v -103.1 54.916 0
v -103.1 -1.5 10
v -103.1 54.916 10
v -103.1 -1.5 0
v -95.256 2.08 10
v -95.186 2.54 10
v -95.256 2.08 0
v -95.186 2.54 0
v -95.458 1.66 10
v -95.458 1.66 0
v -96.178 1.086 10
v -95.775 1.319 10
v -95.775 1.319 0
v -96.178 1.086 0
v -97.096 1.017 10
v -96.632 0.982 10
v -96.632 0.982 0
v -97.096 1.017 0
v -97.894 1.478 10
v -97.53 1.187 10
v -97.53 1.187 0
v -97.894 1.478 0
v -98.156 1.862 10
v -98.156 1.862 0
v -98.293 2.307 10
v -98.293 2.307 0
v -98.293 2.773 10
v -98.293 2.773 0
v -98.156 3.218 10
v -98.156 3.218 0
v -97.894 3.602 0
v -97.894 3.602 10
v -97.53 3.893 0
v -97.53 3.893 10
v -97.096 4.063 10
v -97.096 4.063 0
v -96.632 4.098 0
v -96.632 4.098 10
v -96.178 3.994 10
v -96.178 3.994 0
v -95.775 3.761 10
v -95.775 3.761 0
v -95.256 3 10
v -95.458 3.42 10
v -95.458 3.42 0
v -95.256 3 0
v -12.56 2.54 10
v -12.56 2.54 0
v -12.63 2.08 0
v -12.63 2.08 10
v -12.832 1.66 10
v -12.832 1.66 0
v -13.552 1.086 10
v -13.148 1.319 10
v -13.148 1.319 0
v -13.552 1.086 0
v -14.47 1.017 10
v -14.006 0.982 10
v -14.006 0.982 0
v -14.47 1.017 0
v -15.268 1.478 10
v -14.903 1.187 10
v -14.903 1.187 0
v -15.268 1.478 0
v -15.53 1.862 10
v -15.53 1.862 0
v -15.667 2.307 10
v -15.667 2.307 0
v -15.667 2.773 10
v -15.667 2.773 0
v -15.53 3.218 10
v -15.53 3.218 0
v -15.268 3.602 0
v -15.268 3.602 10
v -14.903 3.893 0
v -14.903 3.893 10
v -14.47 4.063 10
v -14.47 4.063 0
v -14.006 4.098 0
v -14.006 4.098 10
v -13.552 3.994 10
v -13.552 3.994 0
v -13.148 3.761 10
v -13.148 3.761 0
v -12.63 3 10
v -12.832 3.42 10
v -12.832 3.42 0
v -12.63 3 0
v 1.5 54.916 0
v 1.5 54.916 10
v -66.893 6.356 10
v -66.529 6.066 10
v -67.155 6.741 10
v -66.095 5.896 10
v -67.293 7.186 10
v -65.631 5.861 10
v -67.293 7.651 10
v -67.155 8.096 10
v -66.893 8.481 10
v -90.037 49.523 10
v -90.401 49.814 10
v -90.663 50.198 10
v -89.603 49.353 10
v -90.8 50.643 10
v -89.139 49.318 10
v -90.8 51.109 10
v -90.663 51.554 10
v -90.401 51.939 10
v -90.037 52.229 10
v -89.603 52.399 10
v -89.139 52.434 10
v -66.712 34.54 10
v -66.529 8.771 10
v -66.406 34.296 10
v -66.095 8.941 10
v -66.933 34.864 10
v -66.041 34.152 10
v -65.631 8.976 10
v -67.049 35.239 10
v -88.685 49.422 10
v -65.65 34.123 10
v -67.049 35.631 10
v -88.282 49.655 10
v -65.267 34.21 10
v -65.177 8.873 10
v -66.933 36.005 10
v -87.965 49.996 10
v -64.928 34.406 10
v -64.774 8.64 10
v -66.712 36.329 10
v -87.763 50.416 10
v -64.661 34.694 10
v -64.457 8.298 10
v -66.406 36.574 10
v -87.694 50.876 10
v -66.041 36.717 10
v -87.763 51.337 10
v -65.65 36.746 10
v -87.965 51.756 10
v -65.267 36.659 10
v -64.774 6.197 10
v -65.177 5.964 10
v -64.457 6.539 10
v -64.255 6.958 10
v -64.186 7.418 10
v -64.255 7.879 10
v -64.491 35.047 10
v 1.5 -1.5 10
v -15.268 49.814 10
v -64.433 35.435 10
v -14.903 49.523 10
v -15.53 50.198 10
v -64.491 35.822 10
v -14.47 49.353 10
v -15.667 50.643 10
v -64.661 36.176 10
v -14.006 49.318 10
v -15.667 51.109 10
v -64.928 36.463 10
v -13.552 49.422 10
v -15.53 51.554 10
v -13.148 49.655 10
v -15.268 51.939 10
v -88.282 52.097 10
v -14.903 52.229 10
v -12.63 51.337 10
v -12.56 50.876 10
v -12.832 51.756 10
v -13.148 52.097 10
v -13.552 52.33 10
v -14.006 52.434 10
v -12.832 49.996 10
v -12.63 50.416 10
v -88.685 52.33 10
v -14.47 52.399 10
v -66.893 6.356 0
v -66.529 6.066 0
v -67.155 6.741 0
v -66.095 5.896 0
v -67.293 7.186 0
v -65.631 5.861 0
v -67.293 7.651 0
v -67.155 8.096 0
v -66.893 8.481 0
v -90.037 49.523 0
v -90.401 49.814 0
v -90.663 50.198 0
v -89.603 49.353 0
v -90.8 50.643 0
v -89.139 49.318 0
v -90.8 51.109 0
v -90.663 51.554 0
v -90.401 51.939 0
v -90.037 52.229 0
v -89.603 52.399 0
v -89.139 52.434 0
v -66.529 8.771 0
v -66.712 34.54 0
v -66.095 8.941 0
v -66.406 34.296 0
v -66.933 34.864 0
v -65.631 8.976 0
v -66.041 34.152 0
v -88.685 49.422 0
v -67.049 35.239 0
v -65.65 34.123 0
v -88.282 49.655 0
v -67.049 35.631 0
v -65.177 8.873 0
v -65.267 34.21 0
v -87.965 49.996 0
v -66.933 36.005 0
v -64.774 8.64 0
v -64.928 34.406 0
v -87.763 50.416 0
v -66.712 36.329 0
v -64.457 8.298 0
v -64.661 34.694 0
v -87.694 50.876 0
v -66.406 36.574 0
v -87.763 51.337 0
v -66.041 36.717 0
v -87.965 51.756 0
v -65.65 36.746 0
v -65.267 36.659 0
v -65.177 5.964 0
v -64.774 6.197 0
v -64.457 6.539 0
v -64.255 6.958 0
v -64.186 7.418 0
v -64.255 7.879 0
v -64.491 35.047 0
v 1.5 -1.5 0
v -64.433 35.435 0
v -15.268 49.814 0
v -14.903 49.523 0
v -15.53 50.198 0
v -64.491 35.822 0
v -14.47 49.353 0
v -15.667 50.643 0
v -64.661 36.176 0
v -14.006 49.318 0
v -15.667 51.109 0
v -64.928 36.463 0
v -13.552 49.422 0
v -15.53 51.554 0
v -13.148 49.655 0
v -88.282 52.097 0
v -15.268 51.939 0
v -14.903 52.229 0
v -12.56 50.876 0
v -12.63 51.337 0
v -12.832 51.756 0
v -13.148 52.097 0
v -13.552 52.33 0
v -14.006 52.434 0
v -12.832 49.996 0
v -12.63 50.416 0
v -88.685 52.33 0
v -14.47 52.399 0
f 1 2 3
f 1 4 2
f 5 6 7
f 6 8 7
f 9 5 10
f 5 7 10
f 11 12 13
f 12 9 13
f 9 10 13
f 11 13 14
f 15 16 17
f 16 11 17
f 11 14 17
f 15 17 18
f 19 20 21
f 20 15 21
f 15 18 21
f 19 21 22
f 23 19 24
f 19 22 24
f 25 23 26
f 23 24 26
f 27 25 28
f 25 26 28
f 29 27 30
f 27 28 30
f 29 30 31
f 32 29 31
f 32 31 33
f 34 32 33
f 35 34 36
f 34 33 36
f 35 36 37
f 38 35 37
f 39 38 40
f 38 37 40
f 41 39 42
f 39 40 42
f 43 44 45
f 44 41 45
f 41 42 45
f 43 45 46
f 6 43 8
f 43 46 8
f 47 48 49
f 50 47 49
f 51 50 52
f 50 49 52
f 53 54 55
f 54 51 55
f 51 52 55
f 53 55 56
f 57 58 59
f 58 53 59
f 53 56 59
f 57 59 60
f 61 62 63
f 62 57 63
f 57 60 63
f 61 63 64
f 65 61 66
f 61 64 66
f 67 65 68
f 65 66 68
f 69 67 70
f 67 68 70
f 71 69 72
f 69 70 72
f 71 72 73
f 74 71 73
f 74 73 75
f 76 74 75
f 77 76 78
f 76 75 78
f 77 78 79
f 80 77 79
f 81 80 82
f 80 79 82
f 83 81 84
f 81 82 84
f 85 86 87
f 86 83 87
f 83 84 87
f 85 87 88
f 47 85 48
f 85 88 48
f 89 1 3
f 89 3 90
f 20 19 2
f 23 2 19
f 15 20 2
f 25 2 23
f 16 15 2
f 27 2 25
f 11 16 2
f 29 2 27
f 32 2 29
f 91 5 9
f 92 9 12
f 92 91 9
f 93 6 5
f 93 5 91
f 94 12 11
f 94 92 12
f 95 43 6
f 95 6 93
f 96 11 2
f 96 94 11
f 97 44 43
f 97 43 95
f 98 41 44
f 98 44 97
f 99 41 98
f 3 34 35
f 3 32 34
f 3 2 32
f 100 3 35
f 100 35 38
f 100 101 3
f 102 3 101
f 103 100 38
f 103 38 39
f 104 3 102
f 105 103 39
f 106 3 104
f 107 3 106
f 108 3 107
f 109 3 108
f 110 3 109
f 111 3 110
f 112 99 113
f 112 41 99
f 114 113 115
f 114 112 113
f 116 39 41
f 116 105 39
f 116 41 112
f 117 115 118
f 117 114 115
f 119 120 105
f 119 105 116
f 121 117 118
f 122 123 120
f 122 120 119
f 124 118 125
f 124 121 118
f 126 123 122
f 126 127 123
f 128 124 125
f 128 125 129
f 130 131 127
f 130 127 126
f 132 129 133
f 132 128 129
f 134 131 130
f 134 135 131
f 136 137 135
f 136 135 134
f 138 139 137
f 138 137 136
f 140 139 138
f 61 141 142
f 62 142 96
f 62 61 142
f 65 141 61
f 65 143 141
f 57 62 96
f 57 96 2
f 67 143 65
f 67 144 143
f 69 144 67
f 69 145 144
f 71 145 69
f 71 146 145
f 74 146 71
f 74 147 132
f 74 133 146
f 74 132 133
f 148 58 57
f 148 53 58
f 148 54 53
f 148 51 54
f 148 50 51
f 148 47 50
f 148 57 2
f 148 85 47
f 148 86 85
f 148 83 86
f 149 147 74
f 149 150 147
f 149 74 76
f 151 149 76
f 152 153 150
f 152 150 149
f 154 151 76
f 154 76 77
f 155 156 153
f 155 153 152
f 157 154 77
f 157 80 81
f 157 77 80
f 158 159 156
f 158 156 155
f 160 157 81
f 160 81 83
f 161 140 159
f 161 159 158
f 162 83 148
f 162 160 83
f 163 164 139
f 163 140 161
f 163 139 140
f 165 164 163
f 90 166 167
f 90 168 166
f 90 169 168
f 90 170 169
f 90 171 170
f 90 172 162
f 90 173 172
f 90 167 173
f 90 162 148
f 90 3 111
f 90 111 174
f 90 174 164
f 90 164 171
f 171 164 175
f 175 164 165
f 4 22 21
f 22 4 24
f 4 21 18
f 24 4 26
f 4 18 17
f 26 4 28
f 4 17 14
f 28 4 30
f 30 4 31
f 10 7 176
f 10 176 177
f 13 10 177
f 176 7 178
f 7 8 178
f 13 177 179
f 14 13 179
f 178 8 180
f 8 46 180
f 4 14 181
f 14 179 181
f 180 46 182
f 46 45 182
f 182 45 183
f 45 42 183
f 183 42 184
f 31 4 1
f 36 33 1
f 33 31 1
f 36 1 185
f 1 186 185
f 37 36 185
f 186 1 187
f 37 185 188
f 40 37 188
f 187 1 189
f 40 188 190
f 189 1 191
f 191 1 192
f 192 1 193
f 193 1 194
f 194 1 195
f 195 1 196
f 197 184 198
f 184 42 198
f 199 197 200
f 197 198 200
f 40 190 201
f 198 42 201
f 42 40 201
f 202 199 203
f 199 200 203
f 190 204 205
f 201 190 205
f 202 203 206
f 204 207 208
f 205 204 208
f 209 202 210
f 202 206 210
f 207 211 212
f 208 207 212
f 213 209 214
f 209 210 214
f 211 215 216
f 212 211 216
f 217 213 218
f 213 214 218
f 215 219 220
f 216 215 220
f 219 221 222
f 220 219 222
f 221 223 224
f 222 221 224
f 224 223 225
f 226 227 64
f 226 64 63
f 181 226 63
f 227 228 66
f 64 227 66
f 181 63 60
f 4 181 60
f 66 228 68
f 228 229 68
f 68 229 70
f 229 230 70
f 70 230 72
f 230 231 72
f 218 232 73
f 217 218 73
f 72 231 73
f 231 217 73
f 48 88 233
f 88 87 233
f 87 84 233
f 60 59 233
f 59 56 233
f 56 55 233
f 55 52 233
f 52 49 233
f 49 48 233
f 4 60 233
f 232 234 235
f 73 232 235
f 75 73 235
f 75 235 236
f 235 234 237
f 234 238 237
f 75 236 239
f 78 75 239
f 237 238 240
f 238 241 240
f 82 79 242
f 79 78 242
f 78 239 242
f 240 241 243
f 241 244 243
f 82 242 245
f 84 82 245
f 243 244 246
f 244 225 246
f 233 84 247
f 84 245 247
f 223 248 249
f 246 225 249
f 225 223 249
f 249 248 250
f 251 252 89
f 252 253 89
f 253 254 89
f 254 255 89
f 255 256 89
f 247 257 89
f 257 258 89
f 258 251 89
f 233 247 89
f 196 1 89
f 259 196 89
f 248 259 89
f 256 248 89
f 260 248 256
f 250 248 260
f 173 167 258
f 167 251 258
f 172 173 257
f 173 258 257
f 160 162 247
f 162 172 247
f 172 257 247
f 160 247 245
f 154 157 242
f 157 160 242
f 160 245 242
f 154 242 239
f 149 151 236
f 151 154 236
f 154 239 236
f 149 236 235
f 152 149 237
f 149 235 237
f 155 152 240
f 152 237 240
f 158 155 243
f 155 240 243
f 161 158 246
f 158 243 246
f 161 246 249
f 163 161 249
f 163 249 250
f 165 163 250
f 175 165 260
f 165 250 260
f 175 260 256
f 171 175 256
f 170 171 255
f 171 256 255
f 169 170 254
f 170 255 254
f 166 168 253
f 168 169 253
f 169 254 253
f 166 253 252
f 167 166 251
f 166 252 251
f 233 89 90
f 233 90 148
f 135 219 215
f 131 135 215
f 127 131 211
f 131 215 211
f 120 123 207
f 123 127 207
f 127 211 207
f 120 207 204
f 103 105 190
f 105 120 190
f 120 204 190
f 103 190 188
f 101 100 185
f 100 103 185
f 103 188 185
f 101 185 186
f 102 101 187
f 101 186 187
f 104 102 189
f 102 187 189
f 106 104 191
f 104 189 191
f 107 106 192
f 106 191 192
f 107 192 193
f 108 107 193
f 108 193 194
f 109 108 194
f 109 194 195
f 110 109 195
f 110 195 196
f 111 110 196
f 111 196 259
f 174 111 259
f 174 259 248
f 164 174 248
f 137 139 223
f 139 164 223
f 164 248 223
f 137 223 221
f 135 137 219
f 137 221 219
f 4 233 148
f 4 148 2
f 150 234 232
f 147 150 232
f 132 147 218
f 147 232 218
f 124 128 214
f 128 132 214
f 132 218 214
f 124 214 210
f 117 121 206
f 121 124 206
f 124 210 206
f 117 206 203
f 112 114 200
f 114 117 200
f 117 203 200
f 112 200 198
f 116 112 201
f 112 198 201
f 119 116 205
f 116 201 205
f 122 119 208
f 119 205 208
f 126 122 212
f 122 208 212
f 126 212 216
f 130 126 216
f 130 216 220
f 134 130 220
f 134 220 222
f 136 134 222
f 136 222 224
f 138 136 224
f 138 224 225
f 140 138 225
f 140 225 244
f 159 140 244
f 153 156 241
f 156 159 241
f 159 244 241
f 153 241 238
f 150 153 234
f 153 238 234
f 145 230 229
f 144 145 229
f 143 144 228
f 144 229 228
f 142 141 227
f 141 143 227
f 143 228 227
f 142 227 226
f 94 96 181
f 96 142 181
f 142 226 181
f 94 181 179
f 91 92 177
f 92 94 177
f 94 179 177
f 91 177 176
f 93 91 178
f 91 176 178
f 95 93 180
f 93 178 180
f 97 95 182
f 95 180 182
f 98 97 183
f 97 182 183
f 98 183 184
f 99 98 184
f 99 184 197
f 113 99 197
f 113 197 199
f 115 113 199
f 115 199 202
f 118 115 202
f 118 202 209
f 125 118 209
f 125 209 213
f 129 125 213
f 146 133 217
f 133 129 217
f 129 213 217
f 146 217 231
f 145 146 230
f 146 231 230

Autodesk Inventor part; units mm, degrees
ref_plane "YZ Plane" through (0, 0, 0) normal (1, 0, 0) x (0, 1, 0)
ref_plane "XZ Plane" through (0, 0, 0) normal (0, 1, 0) x (-1, 0, 0)
ref_plane "XY Plane" through (0, 0, 0) normal (0, 0, 1) x (1, 0, 0)
ref_plane "작업 평면1" through (0, 0, 0) normal (0, 0, 1) x (1, 0, 0)
sketch "스케치1" plane through (0, 0, 0) normal (0, 0, 1) x (1, 0, 0)
  line L0 (-103.1, 54.9162) -> (1.5, 54.9162)
  line L1 (1.5, 54.9162) -> (1.5, -1.5)
  line L2 (1.5, -1.5) -> (-103.1, -1.5)
  line L3 (-103.1, -1.5) -> (-103.1, 54.9162)
  line L4 (0, 1.524) -> (0, 51.8922) projected
  line L5 (-99.06, 40.7162) -> (-101.6, 38.1762) projected
  line L6 (-101.6, 38.1762) -> (-101.6, 3.556) projected
  line L7 (-101.6, 3.556) -> (-98.044, 0) projected
  line L8 (-98.044, 0) -> (-1.524, 0) projected
  line L9 (-1.524, 0) -> (0, 1.524) projected
  line L10 (0, 1.524) -> (0, 51.8922) projected
  line L11 (0, 51.8922) -> (-1.524, 53.4162) projected
  line L12 (-1.524, 53.4162) -> (-97.2966, 53.4162) projected
  line L13 (-97.2966, 53.4162) -> (-99.06, 51.6528) projected
  line L14 (-99.06, 51.6528) -> (-99.06, 40.7162) projected
  circle A0 centre (-89.2556, 50.8762) radius 1.5621 projected
  circle A1 centre (-65.7479, 35.4347) radius 1.3153 projected
  circle A2 centre (-65.7479, 7.4185) radius 1.5621 projected
  circle A3 centre (-96.7486, 2.54) radius 1.5621 projected
  circle A4 centre (-14.1224, 2.54) radius 1.5621 projected
  circle A5 centre (-14.1224, 50.8762) radius 1.5621 projected
  line L15 (-91.7703, 3.1886) -> (-92.8414, 3.1886) projected
  line L16 (-91.7703, 1.1751) -> (-91.7703, 3.1886) projected
  line L17 (-92.8414, 1.1751) -> (-91.7703, 1.1751) projected
  line L18 (-92.8414, 3.1886) -> (-92.8414, 1.1751) projected
  line L19 (-86.6903, 1.1751) -> (-86.6903, 3.1886) projected
  line L20 (-87.7614, 1.1751) -> (-86.6903, 1.1751) projected
  line L21 (-87.7614, 3.1886) -> (-87.7614, 1.1751) projected
  line L22 (-86.6903, 3.1886) -> (-87.7614, 3.1886) projected
  line L23 (-81.6103, 1.1751) -> (-81.6103, 3.1886) projected
  line L24 (-82.6814, 1.1751) -> (-81.6103, 1.1751) projected
  line L25 (-82.6814, 3.1886) -> (-82.6814, 1.1751) projected
  line L26 (-81.6103, 3.1886) -> (-82.6814, 3.1886) projected
  line L27 (-76.5303, 1.1751) -> (-76.5303, 3.1886) projected
  line L28 (-77.6014, 1.1751) -> (-76.5303, 1.1751) projected
  line L29 (-77.6014, 3.1886) -> (-77.6014, 1.1751) projected
  line L30 (-76.5303, 3.1886) -> (-77.6014, 3.1886) projected
  line L31 (-68.6825, 3.4297) -> (-69.7244, 3.4297) projected
  line L32 (-68.6825, 1.346) -> (-68.6825, 3.4297) projected
  line L33 (-69.7244, 1.346) -> (-68.6825, 1.346) projected
  line L34 (-69.7244, 3.4297) -> (-69.7244, 1.346) projected
  line L35 (-63.6025, 1.346) -> (-63.6025, 3.4297) projected
  line L36 (-64.6444, 1.346) -> (-63.6025, 1.346) projected
  line L37 (-64.6444, 3.4297) -> (-64.6444, 1.346) projected
  line L38 (-63.6025, 3.4297) -> (-64.6444, 3.4297) projected
  line L39 (-58.5225, 1.346) -> (-58.5225, 3.4297) projected
  line L40 (-59.5644, 1.346) -> (-58.5225, 1.346) projected
  line L41 (-59.5644, 3.4297) -> (-59.5644, 1.346) projected
  line L42 (-58.5225, 3.4297) -> (-59.5644, 3.4297) projected
  line L43 (-53.4425, 1.346) -> (-53.4425, 3.4297) projected
  line L44 (-54.4844, 1.346) -> (-53.4425, 1.346) projected
  line L45 (-54.4844, 3.4297) -> (-54.4844, 1.346) projected
  line L46 (-53.4425, 3.4297) -> (-54.4844, 3.4297) projected
  line L47 (-45.4737, 3.6867) -> (-46.5774, 3.6867) projected
  line L48 (-45.4737, 1.6118) -> (-45.4737, 3.6867) projected
  line L49 (-46.5774, 1.6118) -> (-45.4737, 1.6118) projected
  line L50 (-46.5774, 3.6867) -> (-46.5774, 1.6118) projected
  line L51 (-40.3937, 1.6118) -> (-40.3937, 3.6867) projected
  line L52 (-41.4974, 1.6118) -> (-40.3937, 1.6118) projected
  line L53 (-41.4974, 3.6867) -> (-41.4974, 1.6118) projected
  line L54 (-40.3937, 3.6867) -> (-41.4974, 3.6867) projected
  line L55 (-35.3137, 1.6118) -> (-35.3137, 3.6867) projected
  line L56 (-36.4174, 1.6118) -> (-35.3137, 1.6118) projected
  line L57 (-36.4174, 3.6867) -> (-36.4174, 1.6118) projected
  line L58 (-35.3137, 3.6867) -> (-36.4174, 3.6867) projected
  circle A6 centre (-97.5648, 7.2848) radius 0.5739 projected
  circle A7 centre (-95.0248, 7.2848) radius 0.5739 projected
  circle A8 centre (-95.0248, 9.8248) radius 0.5739 projected
  circle A9 centre (-95.0248, 12.3648) radius 0.5739 projected
  circle A10 centre (-95.0248, 14.9048) radius 0.5739 projected
  circle A11 centre (-95.0248, 17.4448) radius 0.5739 projected
  circle A12 centre (-95.0248, 19.9848) radius 0.5739 projected
  circle A13 centre (-95.0248, 22.5248) radius 0.5739 projected
  circle A14 centre (-95.0248, 25.0648) radius 0.5739 projected
  circle A15 centre (-95.0248, 27.6048) radius 0.5739 projected
  circle A16 centre (-95.0248, 30.1448) radius 0.5739 projected
  circle A17 centre (-95.0248, 32.6848) radius 0.5739 projected
  circle A18 centre (-95.0248, 35.2248) radius 0.5739 projected
  circle A19 centre (-95.0248, 37.7648) radius 0.5739 projected
  circle A20 centre (-95.0248, 40.3048) radius 0.5739 projected
  circle A21 centre (-95.0248, 42.8448) radius 0.5739 projected
  circle A22 centre (-95.0248, 45.3848) radius 0.5739 projected
  circle A23 centre (-95.0248, 47.9248) radius 0.5739 projected
  circle A24 centre (-95.0248, 50.4648) radius 0.5739 projected
  line L59 (-81.8933, 50.0717) -> (-81.8933, 51.6679) projected
  line L60 (-82.3984, 50.0717) -> (-81.8933, 50.0717) projected
  line L61 (-82.3984, 51.6679) -> (-82.3984, 50.0717) projected
  line L62 (-81.8933, 51.6679) -> (-82.3984, 51.6679) projected
  line L63 (-76.8133, 50.0717) -> (-76.8133, 51.6679) projected
  line L64 (-77.3184, 50.0717) -> (-76.8133, 50.0717) projected
  line L65 (-77.3184, 51.6679) -> (-77.3184, 50.0717) projected
  line L66 (-76.8133, 51.6679) -> (-77.3184, 51.6679) projected
  line L67 (-71.7333, 50.0717) -> (-71.7333, 51.6679) projected
  line L68 (-72.2384, 50.0717) -> (-71.7333, 50.0717) projected
  line L69 (-72.2384, 51.6679) -> (-72.2384, 50.0717) projected
  line L70 (-71.7333, 51.6679) -> (-72.2384, 51.6679) projected
  line L71 (-63.4227, 51.9137) -> (-64.2563, 51.9137) projected
  line L72 (-63.4227, 50.0717) -> (-63.4227, 51.9137) projected
  line L73 (-64.2563, 50.0717) -> (-63.4227, 50.0717) projected
  line L74 (-64.2563, 51.9137) -> (-64.2563, 50.0717) projected
  line L75 (-58.3427, 50.0717) -> (-58.3427, 51.9137) projected
  line L76 (-59.1763, 50.0717) -> (-58.3427, 50.0717) projected
  line L77 (-59.1763, 51.9137) -> (-59.1763, 50.0717) projected
  line L78 (-58.3427, 51.9137) -> (-59.1763, 51.9137) projected
  line L79 (-53.2627, 50.0717) -> (-53.2627, 51.9137) projected
  line L80 (-54.0963, 50.0717) -> (-53.2627, 50.0717) projected
  line L81 (-54.0963, 51.9137) -> (-54.0963, 50.0717) projected
  line L82 (-53.2627, 51.9137) -> (-54.0963, 51.9137) projected
  line L83 (-48.1827, 50.0717) -> (-48.1827, 51.9137) projected
  line L84 (-49.0163, 50.0717) -> (-48.1827, 50.0717) projected
  line L85 (-49.0163, 51.9137) -> (-49.0163, 50.0717) projected
  line L86 (-48.1827, 51.9137) -> (-49.0163, 51.9137) projected
  line L87 (-41.4974, 51.9137) -> (-42.4723, 51.9137) projected
  line L88 (-41.4974, 50.0717) -> (-41.4974, 51.9137) projected
  line L89 (-42.4723, 50.0717) -> (-41.4974, 50.0717) projected
  line L90 (-42.4723, 51.9137) -> (-42.4723, 50.0717) projected
  line L91 (-36.4174, 50.0717) -> (-36.4174, 51.9137) projected
  line L92 (-37.3923, 50.0717) -> (-36.4174, 50.0717) projected
  line L93 (-37.3923, 51.9137) -> (-37.3923, 50.0717) projected
  line L94 (-36.4174, 51.9137) -> (-37.3923, 51.9137) projected
  line L95 (-31.3374, 50.0717) -> (-31.3374, 51.9137) projected
  line L96 (-32.3123, 50.0717) -> (-31.3374, 50.0717) projected
  line L97 (-32.3123, 51.9137) -> (-32.3123, 50.0717) projected
  line L98 (-31.3374, 51.9137) -> (-32.3123, 51.9137) projected
  line L99 (-26.2574, 50.0717) -> (-26.2574, 51.9137) projected
  line L100 (-27.2323, 50.0717) -> (-26.2574, 50.0717) projected
  line L101 (-27.2323, 51.9137) -> (-27.2323, 50.0717) projected
  line L102 (-26.2574, 51.9137) -> (-27.2323, 51.9137) projected
  circle A25 centre (-20.5945, 47.6784) radius 0.5437 projected
  circle A26 centre (-18.0545, 47.6784) radius 0.5437 projected
  circle A27 centre (-20.5945, 45.1384) radius 0.5437 projected
  circle A28 centre (-15.5145, 45.1384) radius 0.5437 projected
  circle A29 centre (-5.7466, 39.5769) radius 0.4144 projected
  circle A30 centre (-5.7466, 37.0369) radius 0.4144 projected
  line L103 (-7.393, 4.043) -> (-10.0091, 4.043) projected
  line L104 (-7.393, 3.3305) -> (-7.393, 4.043) projected
  line L105 (-10.0091, 3.3305) -> (-7.393, 3.3305) projected
  line L106 (-10.0091, 4.043) -> (-10.0091, 3.3305) projected
  line L107 (-2.4767, 32.5537) -> (-4.2776, 32.5537) projected
  line L108 (-2.4767, 31.6979) -> (-2.4767, 32.5537) projected
  line L109 (-4.2776, 31.6979) -> (-2.4767, 31.6979) projected
  line L110 (-4.2776, 32.5537) -> (-4.2776, 31.6979) projected
  line L111 (-2.249, 44.6927) -> (-4.5054, 44.6927) projected
  line L112 (-2.249, 43.8153) -> (-2.249, 44.6927) projected
  line L113 (-4.5054, 43.8153) -> (-2.249, 43.8153) projected
  line L114 (-4.5054, 44.6927) -> (-4.5054, 43.8153) projected
  line L115 (-5.2737, 10.2292) -> (-5.7128, 10.2292) projected
  line L116 (-5.2737, 7.3652) -> (-5.2737, 10.2292) projected
  line L117 (-5.7128, 7.3652) -> (-5.2737, 7.3652) projected
  line L118 (-5.7128, 10.2292) -> (-5.7128, 7.3652) projected
  circle A31 centre (-8.2866, 37.0369) radius 0.4144 projected
  line L119 (-11.4599, 10.2292) -> (-12.1472, 10.2292) projected
  line L120 (-11.4599, 7.3652) -> (-11.4599, 10.2292) projected
  line L121 (-12.1472, 7.3652) -> (-11.4599, 7.3652) projected
  line L122 (-12.1472, 10.2292) -> (-12.1472, 7.3652) projected
  circle A32 centre (-18.0545, 45.1384) radius 0.5437 projected
  circle A33 centre (-15.5145, 47.6784) radius 0.5437 projected
  circle A34 centre (-8.2866, 39.5769) radius 0.4144 projected
  line L123 (-23.7174, 50.0717) -> (-23.7174, 51.9137) projected
  line L124 (-24.6923, 50.0717) -> (-23.7174, 50.0717) projected
  line L125 (-24.6923, 51.9137) -> (-24.6923, 50.0717) projected
  line L126 (-23.7174, 51.9137) -> (-24.6923, 51.9137) projected
  line L127 (-28.7974, 50.0717) -> (-28.7974, 51.9137) projected
  line L128 (-29.7723, 50.0717) -> (-28.7974, 50.0717) projected
  line L129 (-29.7723, 51.9137) -> (-29.7723, 50.0717) projected
  line L130 (-28.7974, 51.9137) -> (-29.7723, 51.9137) projected
  line L131 (-33.8774, 50.0717) -> (-33.8774, 51.9137) projected
  line L132 (-34.8523, 50.0717) -> (-33.8774, 50.0717) projected
  line L133 (-34.8523, 51.9137) -> (-34.8523, 50.0717) projected
  line L134 (-33.8774, 51.9137) -> (-34.8523, 51.9137) projected
  line L135 (-38.9574, 50.0717) -> (-38.9574, 51.9137) projected
  line L136 (-39.9323, 50.0717) -> (-38.9574, 50.0717) projected
  line L137 (-39.9323, 51.9137) -> (-39.9323, 50.0717) projected
  line L138 (-38.9574, 51.9137) -> (-39.9323, 51.9137) projected
  line L139 (-45.6427, 50.0717) -> (-45.6427, 51.9137) projected
  line L140 (-46.4763, 50.0717) -> (-45.6427, 50.0717) projected
  line L141 (-46.4763, 51.9137) -> (-46.4763, 50.0717) projected
  line L142 (-45.6427, 51.9137) -> (-46.4763, 51.9137) projected
  line L143 (-50.7227, 50.0717) -> (-50.7227, 51.9137) projected
  line L144 (-51.5563, 50.0717) -> (-50.7227, 50.0717) projected
  line L145 (-51.5563, 51.9137) -> (-51.5563, 50.0717) projected
  line L146 (-50.7227, 51.9137) -> (-51.5563, 51.9137) projected
  line L147 (-55.8027, 50.0717) -> (-55.8027, 51.9137) projected
  line L148 (-56.6363, 50.0717) -> (-55.8027, 50.0717) projected
  line L149 (-56.6363, 51.9137) -> (-56.6363, 50.0717) projected
  line L150 (-55.8027, 51.9137) -> (-56.6363, 51.9137) projected
  line L151 (-60.8827, 50.0717) -> (-60.8827, 51.9137) projected
  line L152 (-61.7163, 50.0717) -> (-60.8827, 50.0717) projected
  line L153 (-61.7163, 51.9137) -> (-61.7163, 50.0717) projected
  line L154 (-60.8827, 51.9137) -> (-61.7163, 51.9137) projected
  line L155 (-69.1933, 50.0717) -> (-69.1933, 51.6679) projected
  line L156 (-69.6984, 50.0717) -> (-69.1933, 50.0717) projected
  line L157 (-69.6984, 51.6679) -> (-69.6984, 50.0717) projected
  line L158 (-69.1933, 51.6679) -> (-69.6984, 51.6679) projected
  line L159 (-74.2733, 50.0717) -> (-74.2733, 51.6679) projected
  line L160 (-74.7784, 50.0717) -> (-74.2733, 50.0717) projected
  line L161 (-74.7784, 51.6679) -> (-74.7784, 50.0717) projected
  line L162 (-74.2733, 51.6679) -> (-74.7784, 51.6679) projected
  line L163 (-79.3533, 50.0717) -> (-79.3533, 51.6679) projected
  line L164 (-79.8584, 50.0717) -> (-79.3533, 50.0717) projected
  line L165 (-79.8584, 51.6679) -> (-79.8584, 50.0717) projected
  line L166 (-79.3533, 51.6679) -> (-79.8584, 51.6679) projected
  line L167 (-84.4333, 50.0717) -> (-84.4333, 51.6679) projected
  line L168 (-84.9384, 50.0717) -> (-84.4333, 50.0717) projected
  line L169 (-84.9384, 51.6679) -> (-84.9384, 50.0717) projected
  line L170 (-84.4333, 51.6679) -> (-84.9384, 51.6679) projected
  circle A35 centre (-97.5648, 50.4648) radius 0.5739 projected
  circle A36 centre (-97.5648, 47.9248) radius 0.5739 projected
  circle A37 centre (-97.5648, 45.3848) radius 0.5739 projected
  circle A38 centre (-97.5648, 42.8448) radius 0.5739 projected
  circle A39 centre (-97.5648, 40.3048) radius 0.5739 projected
  circle A40 centre (-97.5648, 37.7648) radius 0.5739 projected
  circle A41 centre (-97.5648, 35.2248) radius 0.5739 projected
  circle A42 centre (-97.5648, 32.6848) radius 0.5739 projected
  circle A43 centre (-97.5648, 30.1448) radius 0.5739 projected
  circle A44 centre (-97.5648, 27.6048) radius 0.5739 projected
  circle A45 centre (-97.5648, 25.0648) radius 0.5739 projected
  circle A46 centre (-97.5648, 22.5248) radius 0.5739 projected
  circle A47 centre (-97.5648, 19.9848) radius 0.5739 projected
  circle A48 centre (-97.5648, 17.4448) radius 0.5739 projected
  circle A49 centre (-97.5648, 14.9048) radius 0.5739 projected
  circle A50 centre (-97.5648, 12.3648) radius 0.5739 projected
  circle A51 centre (-97.5648, 9.8248) radius 0.5739 projected
  line L171 (-86.9733, 51.6679) -> (-87.4784, 51.6679) projected
  line L172 (-86.9733, 50.0717) -> (-86.9733, 51.6679) projected
  line L173 (-87.4784, 50.0717) -> (-86.9733, 50.0717) projected
  line L174 (-87.4784, 51.6679) -> (-87.4784, 50.0717) projected
  line L175 (-32.7737, 1.6118) -> (-32.7737, 3.6867) projected
  line L176 (-33.8774, 1.6118) -> (-32.7737, 1.6118) projected
  line L177 (-33.8774, 3.6867) -> (-33.8774, 1.6118) projected
  line L178 (-32.7737, 3.6867) -> (-33.8774, 3.6867) projected
  line L179 (-37.8537, 1.6118) -> (-37.8537, 3.6867) projected
  line L180 (-38.9574, 1.6118) -> (-37.8537, 1.6118) projected
  line L181 (-38.9574, 3.6867) -> (-38.9574, 1.6118) projected
  line L182 (-37.8537, 3.6867) -> (-38.9574, 3.6867) projected
  line L183 (-42.9337, 1.6118) -> (-42.9337, 3.6867) projected
  line L184 (-44.0374, 1.6118) -> (-42.9337, 1.6118) projected
  line L185 (-44.0374, 3.6867) -> (-44.0374, 1.6118) projected
  line L186 (-42.9337, 3.6867) -> (-44.0374, 3.6867) projected
  line L187 (-50.9025, 1.346) -> (-50.9025, 3.4297) projected
  line L188 (-51.9444, 1.346) -> (-50.9025, 1.346) projected
  line L189 (-51.9444, 3.4297) -> (-51.9444, 1.346) projected
  line L190 (-50.9025, 3.4297) -> (-51.9444, 3.4297) projected
  line L191 (-55.9825, 1.346) -> (-55.9825, 3.4297) projected
  line L192 (-57.0244, 1.346) -> (-55.9825, 1.346) projected
  line L193 (-57.0244, 3.4297) -> (-57.0244, 1.346) projected
  line L194 (-55.9825, 3.4297) -> (-57.0244, 3.4297) projected
  line L195 (-61.0625, 1.346) -> (-61.0625, 3.4297) projected
  line L196 (-62.1044, 1.346) -> (-61.0625, 1.346) projected
  line L197 (-62.1044, 3.4297) -> (-62.1044, 1.346) projected
  line L198 (-61.0625, 3.4297) -> (-62.1044, 3.4297) projected
  line L199 (-66.1425, 1.346) -> (-66.1425, 3.4297) projected
  line L200 (-67.1844, 1.346) -> (-66.1425, 1.346) projected
  line L201 (-67.1844, 3.4297) -> (-67.1844, 1.346) projected
  line L202 (-66.1425, 3.4297) -> (-67.1844, 3.4297) projected
  line L203 (-73.9903, 1.1751) -> (-73.9903, 3.1886) projected
  line L204 (-75.0614, 1.1751) -> (-73.9903, 1.1751) projected
  line L205 (-75.0614, 3.1886) -> (-75.0614, 1.1751) projected
  line L206 (-73.9903, 3.1886) -> (-75.0614, 3.1886) projected
  line L207 (-79.0703, 1.1751) -> (-79.0703, 3.1886) projected
  line L208 (-80.1414, 1.1751) -> (-79.0703, 1.1751) projected
  line L209 (-80.1414, 3.1886) -> (-80.1414, 1.1751) projected
  line L210 (-79.0703, 3.1886) -> (-80.1414, 3.1886) projected
  line L211 (-84.1503, 1.1751) -> (-84.1503, 3.1886) projected
  line L212 (-85.2214, 1.1751) -> (-84.1503, 1.1751) projected
  line L213 (-85.2214, 3.1886) -> (-85.2214, 1.1751) projected
  line L214 (-84.1503, 3.1886) -> (-85.2214, 3.1886) projected
  line L215 (-89.2303, 1.1751) -> (-89.2303, 3.1886) projected
  line L216 (-90.3014, 1.1751) -> (-89.2303, 1.1751) projected
  line L217 (-90.3014, 3.1886) -> (-90.3014, 1.1751) projected
  line L218 (-89.2303, 3.1886) -> (-90.3014, 3.1886) projected
  point P0 (0, 0)
  dimension "d0" = 1.5
  dimension "d1" = 1.5
  dimension "d2" = 1.5
  dimension "d3" = 1.5
extrude "돌출1" add sketch "스케치1" along normal blind 10 contours L0 L1 L2 L3 | L9 L8 L7 L6 L5 L14 L13 L12 L11 L4 | L16 L17 L18 L15 | L20 L21 L22 L19 | L24 L25 L26 L23 | L28 L29 L30 L27 | L32 L33 L34 L31 | L36 L37 L38 L35 | L40 L41 L42 L39 | L44 L45 L46 L43 | L48 L49 L50 L47 | L52 L53 L54 L51 | L56 L57 L58 L55 | A6 | A7 | A8 | A9 | A10 | A11 | A12 | A13 | A14 | A15 | A16 | A17 | A18 | A19 | A20 | A21 | A22 | A23 | A24 | L60 L61 L62 L59 | L64 L65 L66 L63 | L68 L69 L70 L67 | L72 L73 L74 L71 | L76 L77 L78 L75 | L80 L81 L82 L79 | L84 L85 L86 L83 | L88 L89 L90 L87 | L92 L93 L94 L91 | L96 L97 L98 L95 | L100 L101 L102 L99 | A25 | A26 | A27 | A28 | A29 | A30 | L104 L105 L106 L103 | L108 L109 L110 L107 | L112 L113 L114 L111 | L116 L117 L118 L115 | A31 | L120 L121 L122 L119 | A32 | A33 | A34 | L124 L125 L126 L123 | L128 L129 L130 L127 | L132 L133 L134 L131 | L136 L137 L138 L135 | L140 L141 L142 L139 | L144 L145 L146 L143 | L148 L149 L150 L147 | L152 L153 L154 L151 | L156 L157 L158 L155 | L160 L161 L162 L159 | L164 L165 L166 L163 | L168 L169 L170 L167 | A35 | A36 | A37 | A38 | A39 | A40 | A41 | A42 | A43 | A44 | A45 | A46 | A47 | A48 | A49 | A50 | A51 | L172 L173 L174 L171 | L176 L177 L178 L175 | L180 L181 L182 L179 | L184 L185 L186 L183 | L188 L189 L190 L187 | L192 L193 L194 L191 | L196 L197 L198 L195 | L200 L201 L202 L199 | L204 L205 L206 L203 | L208 L209 L210 L207 | L212 L213 L214 L211 | L216 L217 L218 L215
properties part number "mega_base"
